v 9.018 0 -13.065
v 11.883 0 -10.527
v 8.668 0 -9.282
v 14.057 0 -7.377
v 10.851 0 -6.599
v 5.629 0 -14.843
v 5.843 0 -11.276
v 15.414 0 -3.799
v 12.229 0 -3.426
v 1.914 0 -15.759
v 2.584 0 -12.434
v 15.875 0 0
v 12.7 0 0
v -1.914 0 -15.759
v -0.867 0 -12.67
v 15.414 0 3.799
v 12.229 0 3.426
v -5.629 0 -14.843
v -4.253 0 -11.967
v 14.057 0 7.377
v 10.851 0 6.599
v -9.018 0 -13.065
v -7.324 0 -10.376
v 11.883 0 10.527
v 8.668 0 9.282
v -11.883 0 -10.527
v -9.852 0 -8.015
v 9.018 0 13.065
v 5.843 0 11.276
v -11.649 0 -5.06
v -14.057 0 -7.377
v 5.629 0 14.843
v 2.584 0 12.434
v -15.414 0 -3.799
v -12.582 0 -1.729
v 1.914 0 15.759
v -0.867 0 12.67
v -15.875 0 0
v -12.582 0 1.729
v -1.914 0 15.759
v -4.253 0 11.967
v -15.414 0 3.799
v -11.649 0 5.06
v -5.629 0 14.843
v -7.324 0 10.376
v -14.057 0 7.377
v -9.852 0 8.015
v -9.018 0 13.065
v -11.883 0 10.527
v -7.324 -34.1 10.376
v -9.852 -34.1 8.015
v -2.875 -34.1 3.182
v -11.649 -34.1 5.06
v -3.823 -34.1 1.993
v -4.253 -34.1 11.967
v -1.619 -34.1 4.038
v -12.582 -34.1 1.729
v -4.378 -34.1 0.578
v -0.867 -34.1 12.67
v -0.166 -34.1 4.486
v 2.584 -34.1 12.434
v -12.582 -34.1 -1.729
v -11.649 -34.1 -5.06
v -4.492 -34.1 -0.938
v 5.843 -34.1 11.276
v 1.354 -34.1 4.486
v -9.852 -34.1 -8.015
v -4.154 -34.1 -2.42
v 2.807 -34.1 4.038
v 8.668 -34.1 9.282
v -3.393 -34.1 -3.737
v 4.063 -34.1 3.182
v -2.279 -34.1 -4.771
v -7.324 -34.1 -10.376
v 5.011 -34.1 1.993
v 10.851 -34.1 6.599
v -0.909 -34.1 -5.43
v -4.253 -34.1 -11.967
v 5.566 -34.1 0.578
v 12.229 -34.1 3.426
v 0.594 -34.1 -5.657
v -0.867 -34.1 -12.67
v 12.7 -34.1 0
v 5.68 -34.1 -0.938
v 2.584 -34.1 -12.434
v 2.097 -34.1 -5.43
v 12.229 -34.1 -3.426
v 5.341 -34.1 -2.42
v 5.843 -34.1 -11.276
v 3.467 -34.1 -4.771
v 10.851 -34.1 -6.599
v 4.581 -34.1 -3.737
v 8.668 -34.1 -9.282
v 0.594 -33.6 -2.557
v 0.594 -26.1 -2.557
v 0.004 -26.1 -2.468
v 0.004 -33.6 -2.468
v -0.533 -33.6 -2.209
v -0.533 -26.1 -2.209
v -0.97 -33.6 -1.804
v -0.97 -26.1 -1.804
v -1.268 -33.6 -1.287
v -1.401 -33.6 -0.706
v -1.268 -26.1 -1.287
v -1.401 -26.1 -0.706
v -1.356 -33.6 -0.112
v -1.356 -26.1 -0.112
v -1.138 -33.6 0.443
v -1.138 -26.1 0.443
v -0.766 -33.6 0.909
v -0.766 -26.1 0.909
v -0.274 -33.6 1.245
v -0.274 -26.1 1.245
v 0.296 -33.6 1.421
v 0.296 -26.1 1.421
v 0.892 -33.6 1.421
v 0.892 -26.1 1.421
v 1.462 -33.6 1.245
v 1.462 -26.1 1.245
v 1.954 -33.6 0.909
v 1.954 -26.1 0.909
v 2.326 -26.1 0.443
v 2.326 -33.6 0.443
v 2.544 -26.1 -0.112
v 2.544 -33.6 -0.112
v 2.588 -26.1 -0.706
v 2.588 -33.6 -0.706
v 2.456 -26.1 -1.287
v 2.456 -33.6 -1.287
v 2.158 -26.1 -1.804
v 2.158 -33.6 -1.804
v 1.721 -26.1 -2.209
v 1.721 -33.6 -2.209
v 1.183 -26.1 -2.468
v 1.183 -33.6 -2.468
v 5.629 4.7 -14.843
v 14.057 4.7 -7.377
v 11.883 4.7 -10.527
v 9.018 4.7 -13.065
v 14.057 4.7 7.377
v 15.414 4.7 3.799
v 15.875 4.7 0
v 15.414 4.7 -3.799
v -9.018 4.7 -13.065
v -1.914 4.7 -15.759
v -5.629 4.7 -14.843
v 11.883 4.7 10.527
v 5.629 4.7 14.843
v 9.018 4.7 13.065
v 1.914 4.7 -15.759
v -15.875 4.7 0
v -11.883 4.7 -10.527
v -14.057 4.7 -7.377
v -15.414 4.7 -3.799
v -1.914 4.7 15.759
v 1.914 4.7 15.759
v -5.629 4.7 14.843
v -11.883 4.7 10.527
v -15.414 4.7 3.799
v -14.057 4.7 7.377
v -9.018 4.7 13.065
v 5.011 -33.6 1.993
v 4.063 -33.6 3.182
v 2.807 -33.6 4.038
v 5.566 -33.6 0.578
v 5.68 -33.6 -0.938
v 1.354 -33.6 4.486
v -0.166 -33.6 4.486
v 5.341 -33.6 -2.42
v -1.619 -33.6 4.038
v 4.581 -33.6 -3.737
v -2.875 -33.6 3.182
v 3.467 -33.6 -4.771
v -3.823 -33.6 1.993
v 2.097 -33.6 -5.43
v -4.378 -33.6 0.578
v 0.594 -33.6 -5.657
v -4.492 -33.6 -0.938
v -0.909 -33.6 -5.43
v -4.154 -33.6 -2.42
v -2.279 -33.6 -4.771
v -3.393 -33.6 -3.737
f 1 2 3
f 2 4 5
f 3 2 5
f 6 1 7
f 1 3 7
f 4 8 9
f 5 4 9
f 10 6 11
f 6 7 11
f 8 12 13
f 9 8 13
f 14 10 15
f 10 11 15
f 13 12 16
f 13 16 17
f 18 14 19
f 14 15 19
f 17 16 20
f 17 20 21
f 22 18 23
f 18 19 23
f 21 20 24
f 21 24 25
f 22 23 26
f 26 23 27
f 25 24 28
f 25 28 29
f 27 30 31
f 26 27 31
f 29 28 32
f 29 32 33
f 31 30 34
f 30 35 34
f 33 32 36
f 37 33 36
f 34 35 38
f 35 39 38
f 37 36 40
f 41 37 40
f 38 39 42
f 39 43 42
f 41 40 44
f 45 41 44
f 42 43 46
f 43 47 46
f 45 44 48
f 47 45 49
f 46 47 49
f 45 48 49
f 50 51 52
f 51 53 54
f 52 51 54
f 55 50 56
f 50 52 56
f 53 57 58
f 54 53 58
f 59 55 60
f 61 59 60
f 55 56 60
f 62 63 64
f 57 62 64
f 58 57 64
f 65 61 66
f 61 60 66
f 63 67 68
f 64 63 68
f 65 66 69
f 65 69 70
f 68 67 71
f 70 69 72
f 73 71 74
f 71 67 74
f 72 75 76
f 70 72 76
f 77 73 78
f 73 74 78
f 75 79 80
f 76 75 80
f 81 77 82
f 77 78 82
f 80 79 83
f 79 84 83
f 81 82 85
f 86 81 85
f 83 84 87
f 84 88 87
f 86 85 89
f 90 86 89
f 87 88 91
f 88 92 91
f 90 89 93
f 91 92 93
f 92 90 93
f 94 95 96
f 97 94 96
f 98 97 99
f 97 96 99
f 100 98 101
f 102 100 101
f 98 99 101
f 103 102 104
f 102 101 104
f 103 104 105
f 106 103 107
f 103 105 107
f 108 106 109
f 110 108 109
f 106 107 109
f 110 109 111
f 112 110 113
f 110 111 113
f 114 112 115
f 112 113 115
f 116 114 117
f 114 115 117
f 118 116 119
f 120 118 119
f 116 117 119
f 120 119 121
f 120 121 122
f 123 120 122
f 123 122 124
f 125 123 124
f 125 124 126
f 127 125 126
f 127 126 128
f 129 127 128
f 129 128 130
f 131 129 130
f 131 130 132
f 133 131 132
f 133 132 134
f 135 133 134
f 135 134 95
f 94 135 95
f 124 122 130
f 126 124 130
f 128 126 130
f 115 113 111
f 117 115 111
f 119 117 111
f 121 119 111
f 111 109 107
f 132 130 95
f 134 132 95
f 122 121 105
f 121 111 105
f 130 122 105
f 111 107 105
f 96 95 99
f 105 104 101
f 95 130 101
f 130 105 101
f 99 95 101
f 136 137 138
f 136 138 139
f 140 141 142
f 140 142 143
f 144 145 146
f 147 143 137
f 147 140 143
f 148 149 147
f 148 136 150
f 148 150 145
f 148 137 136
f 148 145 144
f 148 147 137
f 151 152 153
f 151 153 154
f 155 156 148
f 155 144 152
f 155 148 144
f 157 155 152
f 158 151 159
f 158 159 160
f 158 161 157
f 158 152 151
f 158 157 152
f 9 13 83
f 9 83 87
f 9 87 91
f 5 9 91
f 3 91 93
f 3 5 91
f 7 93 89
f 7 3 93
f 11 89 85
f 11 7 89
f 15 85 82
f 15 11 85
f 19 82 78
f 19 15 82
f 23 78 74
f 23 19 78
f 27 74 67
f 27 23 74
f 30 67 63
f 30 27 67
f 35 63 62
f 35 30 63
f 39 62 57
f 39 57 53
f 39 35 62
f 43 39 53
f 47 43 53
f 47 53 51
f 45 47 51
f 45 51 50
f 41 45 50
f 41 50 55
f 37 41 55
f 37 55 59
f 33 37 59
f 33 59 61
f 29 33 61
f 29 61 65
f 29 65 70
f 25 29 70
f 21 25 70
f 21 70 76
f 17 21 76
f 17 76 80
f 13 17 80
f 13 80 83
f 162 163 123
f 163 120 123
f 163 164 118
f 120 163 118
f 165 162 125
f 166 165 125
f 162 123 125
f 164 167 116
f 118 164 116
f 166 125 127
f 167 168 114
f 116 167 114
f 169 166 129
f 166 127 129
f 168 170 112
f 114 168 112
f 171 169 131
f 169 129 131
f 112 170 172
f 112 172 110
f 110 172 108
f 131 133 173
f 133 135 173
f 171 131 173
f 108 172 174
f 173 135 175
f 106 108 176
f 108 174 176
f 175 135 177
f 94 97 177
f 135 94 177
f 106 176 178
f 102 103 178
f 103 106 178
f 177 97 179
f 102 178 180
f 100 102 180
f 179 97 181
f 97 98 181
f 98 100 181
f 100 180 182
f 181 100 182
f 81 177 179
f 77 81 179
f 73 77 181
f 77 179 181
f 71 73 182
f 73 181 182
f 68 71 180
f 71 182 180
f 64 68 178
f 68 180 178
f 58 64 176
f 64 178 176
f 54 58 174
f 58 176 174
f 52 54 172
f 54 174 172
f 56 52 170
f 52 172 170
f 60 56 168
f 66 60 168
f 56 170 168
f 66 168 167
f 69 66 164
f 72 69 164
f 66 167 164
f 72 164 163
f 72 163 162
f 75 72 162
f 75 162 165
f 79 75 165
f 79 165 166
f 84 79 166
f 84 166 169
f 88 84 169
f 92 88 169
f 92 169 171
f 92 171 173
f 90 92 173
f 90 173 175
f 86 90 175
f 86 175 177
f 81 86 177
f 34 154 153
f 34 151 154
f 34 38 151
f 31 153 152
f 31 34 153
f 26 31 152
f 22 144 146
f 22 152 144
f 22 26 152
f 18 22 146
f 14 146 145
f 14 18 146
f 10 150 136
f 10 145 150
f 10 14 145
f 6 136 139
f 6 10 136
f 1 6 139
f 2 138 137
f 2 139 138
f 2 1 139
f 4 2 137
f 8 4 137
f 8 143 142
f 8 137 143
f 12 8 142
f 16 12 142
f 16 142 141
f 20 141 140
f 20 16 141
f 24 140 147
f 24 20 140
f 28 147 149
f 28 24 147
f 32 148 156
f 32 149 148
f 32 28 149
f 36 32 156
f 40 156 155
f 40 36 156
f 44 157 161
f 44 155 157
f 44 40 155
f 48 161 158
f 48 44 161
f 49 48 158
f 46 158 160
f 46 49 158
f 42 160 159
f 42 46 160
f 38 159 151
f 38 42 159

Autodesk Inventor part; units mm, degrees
ref_plane "YZ Plane" through (0, 0, 0) normal (1, 0, 0) x (0, 1, 0)
ref_plane "XZ Plane" through (0, 0, 0) normal (0, 1, 0) x (-1, 0, 0)
ref_plane "XY Plane" through (0, 0, 0) normal (0, 0, 1) x (1, 0, 0)
sketch "Boceto1" plane through (0, 0, 0) normal (0, 1, 0) x (-1, 0, 0)
  circle A0 centre (0, 0) radius 12.7
  circle A1 centre (0, 0) radius 15.875
  dimension "d0" = 25.4
  dimension "d1" = 31.75
extrude "Extrusión1" add sketch "Boceto1" along normal blind 4.7
sketch "Boceto2" plane through (0, 4.7, 0) normal (0, 1, 0) x (1, 0, 0)
  circle A0 centre (0, 0) radius 12.7
  dimension "d4" = 25.4
extrude "Extrusión2" add sketch "Boceto2" against normal blind 38.8
hole "Agujero1" at (0.5939, -34.1, -0.5568) direction (0, 1, 0) diameter 4 depth 8 counterbore diameter 10.2 counterbore depth 0.5
thread "Rosca1" size "M4x0.7" class "6H" standard "ANSI Metric M Profile" full length
properties part number "post"
